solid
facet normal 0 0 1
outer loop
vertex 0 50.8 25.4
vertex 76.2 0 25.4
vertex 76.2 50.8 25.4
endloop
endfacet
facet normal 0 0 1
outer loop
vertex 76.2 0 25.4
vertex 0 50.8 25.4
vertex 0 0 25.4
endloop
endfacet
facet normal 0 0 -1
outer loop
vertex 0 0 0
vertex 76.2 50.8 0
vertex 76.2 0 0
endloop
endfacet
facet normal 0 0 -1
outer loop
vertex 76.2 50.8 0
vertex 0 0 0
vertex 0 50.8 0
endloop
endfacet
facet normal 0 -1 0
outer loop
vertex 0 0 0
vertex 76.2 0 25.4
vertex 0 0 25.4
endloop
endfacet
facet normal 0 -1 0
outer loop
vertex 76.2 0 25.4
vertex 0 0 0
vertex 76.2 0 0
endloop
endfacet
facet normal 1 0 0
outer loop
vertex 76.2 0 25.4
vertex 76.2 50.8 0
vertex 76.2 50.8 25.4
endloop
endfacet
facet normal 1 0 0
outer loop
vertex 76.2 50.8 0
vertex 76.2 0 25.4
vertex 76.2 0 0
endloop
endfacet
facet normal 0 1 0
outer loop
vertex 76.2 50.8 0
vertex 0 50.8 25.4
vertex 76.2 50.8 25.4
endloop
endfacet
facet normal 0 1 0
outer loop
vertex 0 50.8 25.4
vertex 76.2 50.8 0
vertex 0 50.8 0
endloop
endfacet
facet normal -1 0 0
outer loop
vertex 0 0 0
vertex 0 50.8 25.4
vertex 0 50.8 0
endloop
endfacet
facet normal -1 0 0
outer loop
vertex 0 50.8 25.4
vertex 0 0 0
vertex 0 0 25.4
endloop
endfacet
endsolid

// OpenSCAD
// Unit of length: Unit.MM
cube(size = [76.2, 50.8, 25.4], center = false);
